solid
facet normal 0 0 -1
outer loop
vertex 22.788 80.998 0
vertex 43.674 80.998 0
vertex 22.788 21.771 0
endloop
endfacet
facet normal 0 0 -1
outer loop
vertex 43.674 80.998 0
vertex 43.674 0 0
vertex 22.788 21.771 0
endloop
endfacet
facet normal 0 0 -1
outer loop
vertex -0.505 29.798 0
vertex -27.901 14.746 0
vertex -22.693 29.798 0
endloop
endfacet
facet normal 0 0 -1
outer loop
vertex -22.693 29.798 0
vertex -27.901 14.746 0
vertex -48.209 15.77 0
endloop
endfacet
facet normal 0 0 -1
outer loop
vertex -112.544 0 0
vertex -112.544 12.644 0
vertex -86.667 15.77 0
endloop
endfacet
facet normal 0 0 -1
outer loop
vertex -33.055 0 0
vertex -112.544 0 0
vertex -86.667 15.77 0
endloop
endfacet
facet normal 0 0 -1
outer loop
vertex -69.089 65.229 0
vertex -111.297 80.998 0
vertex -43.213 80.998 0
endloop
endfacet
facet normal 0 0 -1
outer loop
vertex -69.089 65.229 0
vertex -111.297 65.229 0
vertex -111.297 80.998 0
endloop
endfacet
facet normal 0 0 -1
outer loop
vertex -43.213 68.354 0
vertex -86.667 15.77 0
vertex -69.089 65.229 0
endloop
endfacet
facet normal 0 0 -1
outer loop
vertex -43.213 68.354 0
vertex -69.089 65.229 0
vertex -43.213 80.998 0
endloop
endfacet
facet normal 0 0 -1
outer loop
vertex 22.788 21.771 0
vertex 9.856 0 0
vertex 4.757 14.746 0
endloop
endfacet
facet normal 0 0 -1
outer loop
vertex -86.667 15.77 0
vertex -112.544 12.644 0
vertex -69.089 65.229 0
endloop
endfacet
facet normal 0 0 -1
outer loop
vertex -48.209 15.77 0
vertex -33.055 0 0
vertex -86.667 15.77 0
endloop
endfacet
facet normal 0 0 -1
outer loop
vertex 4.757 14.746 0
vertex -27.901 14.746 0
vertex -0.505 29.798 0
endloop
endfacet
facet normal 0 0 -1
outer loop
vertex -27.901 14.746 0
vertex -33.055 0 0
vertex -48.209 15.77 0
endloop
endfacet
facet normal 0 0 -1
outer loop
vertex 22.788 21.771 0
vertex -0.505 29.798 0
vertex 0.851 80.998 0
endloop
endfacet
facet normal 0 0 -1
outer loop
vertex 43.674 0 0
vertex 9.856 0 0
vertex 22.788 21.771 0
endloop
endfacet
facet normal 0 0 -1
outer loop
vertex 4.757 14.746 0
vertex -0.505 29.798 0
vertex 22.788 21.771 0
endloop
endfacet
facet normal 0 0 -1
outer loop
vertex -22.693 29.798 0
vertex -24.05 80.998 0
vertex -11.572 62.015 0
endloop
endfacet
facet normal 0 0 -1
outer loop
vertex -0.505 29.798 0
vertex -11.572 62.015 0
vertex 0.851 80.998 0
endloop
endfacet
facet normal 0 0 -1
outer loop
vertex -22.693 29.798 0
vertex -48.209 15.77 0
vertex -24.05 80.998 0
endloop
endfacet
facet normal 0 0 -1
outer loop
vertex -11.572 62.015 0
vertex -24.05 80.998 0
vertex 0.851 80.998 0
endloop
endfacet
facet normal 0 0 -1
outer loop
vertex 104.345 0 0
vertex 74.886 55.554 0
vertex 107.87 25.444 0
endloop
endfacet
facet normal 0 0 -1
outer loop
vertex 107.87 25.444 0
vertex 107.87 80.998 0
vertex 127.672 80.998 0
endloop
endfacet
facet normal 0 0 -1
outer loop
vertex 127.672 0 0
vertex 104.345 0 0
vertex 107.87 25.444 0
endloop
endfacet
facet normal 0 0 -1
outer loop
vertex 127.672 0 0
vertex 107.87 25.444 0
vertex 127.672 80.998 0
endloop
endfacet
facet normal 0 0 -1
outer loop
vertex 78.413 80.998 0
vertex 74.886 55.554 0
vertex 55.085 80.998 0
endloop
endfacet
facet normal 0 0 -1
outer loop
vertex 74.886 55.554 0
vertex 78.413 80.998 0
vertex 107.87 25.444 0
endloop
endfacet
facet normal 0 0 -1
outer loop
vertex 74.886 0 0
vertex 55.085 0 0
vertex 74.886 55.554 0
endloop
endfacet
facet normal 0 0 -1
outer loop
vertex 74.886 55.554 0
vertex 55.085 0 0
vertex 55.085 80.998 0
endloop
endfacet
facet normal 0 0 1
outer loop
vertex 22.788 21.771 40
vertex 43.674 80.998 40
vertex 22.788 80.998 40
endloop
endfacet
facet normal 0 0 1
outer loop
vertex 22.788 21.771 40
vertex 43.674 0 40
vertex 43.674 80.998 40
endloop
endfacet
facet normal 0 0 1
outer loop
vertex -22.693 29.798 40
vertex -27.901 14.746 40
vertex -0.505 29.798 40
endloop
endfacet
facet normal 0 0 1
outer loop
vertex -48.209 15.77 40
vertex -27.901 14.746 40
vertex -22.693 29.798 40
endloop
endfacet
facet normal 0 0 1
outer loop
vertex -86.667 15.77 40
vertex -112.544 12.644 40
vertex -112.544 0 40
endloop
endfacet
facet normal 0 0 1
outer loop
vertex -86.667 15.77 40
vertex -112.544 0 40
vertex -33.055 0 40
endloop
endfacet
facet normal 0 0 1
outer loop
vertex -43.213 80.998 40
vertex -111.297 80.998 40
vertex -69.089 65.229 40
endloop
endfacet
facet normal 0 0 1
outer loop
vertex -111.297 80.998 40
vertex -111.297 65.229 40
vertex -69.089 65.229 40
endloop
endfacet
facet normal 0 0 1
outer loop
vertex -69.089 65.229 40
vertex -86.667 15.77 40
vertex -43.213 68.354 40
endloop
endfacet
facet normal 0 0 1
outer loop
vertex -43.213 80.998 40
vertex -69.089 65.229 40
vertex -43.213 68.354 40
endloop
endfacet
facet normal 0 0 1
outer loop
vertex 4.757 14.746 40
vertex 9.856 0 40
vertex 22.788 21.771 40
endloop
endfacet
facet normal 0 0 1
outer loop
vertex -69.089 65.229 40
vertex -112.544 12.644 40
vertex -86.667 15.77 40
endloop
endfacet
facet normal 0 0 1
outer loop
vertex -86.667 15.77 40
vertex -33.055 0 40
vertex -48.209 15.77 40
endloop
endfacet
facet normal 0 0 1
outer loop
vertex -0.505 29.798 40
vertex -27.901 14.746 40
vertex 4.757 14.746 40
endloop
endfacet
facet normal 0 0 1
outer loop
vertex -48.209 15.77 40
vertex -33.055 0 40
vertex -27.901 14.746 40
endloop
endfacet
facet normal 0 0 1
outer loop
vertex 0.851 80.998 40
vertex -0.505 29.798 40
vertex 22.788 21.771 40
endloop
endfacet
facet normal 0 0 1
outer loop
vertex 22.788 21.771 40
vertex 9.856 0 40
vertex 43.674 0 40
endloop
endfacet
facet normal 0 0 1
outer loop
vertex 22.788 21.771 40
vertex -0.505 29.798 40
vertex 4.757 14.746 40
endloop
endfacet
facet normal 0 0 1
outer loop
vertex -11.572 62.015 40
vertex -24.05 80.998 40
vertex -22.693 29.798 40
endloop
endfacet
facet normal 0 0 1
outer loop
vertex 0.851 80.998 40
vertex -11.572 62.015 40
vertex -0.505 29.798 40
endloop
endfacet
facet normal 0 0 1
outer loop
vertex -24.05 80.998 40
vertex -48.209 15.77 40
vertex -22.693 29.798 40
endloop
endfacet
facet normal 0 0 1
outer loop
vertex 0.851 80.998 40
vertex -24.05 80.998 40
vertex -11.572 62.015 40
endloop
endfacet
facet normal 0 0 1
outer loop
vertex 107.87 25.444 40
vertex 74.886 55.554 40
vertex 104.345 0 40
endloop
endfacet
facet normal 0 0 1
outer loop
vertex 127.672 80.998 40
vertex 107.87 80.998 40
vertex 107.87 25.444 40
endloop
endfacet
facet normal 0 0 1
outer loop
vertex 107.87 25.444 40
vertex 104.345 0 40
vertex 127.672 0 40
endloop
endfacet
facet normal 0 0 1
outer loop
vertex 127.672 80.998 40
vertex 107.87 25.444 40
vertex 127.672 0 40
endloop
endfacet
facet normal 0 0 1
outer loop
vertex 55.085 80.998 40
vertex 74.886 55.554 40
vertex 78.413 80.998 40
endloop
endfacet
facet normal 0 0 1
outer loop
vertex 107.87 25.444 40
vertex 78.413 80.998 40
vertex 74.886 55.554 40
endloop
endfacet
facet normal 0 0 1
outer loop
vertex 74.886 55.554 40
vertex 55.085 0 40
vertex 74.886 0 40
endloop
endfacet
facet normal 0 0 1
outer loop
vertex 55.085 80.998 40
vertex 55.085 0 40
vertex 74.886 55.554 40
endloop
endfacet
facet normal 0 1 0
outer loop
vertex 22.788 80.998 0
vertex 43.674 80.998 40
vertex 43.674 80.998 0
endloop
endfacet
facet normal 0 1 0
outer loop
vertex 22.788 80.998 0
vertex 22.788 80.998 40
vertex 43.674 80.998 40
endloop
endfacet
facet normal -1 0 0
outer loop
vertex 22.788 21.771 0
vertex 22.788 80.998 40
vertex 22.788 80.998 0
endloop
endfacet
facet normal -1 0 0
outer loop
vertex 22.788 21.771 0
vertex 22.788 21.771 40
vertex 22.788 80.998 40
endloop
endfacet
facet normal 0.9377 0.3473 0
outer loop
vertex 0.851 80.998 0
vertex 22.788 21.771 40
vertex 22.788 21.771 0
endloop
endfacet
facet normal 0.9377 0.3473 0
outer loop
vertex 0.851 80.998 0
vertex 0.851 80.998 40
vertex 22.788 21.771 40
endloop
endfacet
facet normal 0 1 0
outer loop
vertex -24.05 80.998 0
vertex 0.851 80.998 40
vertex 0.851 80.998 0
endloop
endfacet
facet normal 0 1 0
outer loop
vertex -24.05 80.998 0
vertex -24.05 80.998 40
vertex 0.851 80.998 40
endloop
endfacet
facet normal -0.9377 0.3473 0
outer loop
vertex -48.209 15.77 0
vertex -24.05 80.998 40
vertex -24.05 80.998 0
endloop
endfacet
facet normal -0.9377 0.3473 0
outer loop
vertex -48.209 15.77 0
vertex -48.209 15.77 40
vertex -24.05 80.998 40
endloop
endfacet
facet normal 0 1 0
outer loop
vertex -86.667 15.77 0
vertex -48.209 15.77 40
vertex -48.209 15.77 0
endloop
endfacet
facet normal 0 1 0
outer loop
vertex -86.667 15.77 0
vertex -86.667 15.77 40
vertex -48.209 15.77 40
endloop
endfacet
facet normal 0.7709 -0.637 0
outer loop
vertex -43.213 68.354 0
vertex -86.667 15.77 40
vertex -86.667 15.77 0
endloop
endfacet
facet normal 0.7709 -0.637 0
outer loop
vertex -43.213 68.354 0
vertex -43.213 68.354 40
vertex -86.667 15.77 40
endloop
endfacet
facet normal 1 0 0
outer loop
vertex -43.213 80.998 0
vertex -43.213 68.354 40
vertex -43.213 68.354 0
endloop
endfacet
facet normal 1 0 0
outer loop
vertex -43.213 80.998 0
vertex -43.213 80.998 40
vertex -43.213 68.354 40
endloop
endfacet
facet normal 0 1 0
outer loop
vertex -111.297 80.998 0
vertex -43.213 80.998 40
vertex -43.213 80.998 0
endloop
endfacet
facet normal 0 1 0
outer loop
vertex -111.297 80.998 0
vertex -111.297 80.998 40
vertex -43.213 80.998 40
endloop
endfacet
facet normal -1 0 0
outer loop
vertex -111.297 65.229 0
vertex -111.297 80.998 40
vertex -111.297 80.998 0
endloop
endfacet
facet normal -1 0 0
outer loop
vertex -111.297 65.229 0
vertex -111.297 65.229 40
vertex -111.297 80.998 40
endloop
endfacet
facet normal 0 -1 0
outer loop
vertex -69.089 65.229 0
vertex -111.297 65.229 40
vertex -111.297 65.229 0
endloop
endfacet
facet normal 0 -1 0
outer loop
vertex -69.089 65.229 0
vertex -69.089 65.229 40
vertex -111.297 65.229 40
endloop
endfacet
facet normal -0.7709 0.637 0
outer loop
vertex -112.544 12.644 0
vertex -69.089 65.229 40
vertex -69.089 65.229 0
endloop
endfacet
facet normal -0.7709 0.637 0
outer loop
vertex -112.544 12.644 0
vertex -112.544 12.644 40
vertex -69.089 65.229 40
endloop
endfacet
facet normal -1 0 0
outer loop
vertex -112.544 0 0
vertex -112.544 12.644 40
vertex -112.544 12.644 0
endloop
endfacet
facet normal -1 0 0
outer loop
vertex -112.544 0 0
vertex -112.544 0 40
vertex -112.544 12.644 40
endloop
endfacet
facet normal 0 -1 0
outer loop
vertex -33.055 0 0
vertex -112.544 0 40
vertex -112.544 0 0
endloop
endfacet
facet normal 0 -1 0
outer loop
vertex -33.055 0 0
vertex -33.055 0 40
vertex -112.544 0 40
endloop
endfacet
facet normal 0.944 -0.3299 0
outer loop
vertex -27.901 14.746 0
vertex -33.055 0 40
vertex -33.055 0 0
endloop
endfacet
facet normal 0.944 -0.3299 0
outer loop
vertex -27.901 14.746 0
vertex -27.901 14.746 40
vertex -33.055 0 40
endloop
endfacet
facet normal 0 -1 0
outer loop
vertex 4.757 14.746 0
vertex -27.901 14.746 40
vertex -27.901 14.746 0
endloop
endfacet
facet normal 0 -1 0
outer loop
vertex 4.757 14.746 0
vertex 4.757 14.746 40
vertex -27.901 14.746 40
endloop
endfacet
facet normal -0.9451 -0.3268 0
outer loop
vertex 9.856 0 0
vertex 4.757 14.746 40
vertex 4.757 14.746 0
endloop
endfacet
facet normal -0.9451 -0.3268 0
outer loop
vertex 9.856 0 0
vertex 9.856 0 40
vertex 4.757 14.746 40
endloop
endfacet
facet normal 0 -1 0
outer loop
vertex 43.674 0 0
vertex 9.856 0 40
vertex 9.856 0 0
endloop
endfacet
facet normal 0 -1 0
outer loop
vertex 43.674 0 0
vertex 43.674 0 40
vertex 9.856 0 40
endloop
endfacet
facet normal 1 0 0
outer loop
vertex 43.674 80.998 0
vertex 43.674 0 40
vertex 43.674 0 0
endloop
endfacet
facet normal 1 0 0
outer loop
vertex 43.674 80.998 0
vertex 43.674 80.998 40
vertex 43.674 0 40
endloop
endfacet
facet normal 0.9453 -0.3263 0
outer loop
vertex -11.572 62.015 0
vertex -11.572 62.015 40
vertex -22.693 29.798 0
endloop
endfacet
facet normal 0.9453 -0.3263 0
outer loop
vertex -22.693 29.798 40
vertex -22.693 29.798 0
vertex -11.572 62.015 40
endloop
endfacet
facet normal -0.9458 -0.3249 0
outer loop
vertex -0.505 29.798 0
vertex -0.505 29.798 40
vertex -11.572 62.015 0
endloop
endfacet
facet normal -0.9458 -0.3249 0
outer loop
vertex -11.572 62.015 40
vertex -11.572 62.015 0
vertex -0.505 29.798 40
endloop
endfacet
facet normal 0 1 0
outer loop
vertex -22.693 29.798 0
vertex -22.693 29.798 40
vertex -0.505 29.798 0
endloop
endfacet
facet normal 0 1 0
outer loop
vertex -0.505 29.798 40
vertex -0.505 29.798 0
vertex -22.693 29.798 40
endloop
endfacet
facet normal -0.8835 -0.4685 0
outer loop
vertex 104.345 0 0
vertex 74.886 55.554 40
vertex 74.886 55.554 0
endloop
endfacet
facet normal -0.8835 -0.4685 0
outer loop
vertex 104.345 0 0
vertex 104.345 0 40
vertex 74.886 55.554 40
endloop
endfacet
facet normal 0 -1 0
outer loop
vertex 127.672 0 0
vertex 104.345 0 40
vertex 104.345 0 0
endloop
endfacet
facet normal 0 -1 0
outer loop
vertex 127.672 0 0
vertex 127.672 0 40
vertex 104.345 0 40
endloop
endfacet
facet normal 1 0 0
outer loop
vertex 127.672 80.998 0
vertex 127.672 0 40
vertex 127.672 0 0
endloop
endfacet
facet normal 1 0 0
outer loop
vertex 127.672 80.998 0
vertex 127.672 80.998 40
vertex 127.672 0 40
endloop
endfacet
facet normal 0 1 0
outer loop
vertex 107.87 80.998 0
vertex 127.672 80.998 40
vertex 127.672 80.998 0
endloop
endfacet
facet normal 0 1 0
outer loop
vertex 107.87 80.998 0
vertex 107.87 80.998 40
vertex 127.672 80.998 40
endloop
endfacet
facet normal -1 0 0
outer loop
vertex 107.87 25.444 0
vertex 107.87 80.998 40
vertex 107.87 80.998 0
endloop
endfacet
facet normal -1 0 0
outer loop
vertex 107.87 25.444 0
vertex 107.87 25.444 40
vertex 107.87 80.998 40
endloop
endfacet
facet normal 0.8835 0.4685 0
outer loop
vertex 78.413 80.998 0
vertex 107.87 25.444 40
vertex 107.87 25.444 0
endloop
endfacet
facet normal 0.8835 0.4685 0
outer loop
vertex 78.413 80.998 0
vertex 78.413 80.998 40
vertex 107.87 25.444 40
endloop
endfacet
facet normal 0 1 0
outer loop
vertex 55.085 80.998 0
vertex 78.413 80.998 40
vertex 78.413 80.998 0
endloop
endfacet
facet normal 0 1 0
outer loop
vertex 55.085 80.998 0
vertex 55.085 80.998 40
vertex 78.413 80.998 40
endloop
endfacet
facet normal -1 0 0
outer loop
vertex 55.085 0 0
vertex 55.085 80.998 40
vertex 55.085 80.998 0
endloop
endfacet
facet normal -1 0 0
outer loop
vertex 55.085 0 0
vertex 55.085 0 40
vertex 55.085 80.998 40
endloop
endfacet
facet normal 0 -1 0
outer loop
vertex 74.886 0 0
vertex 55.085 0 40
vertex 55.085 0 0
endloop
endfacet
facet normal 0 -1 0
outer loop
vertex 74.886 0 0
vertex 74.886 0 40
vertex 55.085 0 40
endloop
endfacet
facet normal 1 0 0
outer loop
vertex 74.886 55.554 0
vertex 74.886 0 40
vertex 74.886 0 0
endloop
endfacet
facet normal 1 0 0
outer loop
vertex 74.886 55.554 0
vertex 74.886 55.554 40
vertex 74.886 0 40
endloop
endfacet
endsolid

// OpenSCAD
//font="Bitstream Vera Sans Bold";
//font="Arial Black";
font="Baskerville:style=Bold";
text_on_flat="ZAIN";
text_size=80;
depth=40;
spacing=0.8;

module the_text() {
linear_extrude(height=depth, convexity=4)
    text(text_on_flat, 
         size=text_size,
         font=font,
         halign="center",
         spacing=spacing);
}

the_text();
